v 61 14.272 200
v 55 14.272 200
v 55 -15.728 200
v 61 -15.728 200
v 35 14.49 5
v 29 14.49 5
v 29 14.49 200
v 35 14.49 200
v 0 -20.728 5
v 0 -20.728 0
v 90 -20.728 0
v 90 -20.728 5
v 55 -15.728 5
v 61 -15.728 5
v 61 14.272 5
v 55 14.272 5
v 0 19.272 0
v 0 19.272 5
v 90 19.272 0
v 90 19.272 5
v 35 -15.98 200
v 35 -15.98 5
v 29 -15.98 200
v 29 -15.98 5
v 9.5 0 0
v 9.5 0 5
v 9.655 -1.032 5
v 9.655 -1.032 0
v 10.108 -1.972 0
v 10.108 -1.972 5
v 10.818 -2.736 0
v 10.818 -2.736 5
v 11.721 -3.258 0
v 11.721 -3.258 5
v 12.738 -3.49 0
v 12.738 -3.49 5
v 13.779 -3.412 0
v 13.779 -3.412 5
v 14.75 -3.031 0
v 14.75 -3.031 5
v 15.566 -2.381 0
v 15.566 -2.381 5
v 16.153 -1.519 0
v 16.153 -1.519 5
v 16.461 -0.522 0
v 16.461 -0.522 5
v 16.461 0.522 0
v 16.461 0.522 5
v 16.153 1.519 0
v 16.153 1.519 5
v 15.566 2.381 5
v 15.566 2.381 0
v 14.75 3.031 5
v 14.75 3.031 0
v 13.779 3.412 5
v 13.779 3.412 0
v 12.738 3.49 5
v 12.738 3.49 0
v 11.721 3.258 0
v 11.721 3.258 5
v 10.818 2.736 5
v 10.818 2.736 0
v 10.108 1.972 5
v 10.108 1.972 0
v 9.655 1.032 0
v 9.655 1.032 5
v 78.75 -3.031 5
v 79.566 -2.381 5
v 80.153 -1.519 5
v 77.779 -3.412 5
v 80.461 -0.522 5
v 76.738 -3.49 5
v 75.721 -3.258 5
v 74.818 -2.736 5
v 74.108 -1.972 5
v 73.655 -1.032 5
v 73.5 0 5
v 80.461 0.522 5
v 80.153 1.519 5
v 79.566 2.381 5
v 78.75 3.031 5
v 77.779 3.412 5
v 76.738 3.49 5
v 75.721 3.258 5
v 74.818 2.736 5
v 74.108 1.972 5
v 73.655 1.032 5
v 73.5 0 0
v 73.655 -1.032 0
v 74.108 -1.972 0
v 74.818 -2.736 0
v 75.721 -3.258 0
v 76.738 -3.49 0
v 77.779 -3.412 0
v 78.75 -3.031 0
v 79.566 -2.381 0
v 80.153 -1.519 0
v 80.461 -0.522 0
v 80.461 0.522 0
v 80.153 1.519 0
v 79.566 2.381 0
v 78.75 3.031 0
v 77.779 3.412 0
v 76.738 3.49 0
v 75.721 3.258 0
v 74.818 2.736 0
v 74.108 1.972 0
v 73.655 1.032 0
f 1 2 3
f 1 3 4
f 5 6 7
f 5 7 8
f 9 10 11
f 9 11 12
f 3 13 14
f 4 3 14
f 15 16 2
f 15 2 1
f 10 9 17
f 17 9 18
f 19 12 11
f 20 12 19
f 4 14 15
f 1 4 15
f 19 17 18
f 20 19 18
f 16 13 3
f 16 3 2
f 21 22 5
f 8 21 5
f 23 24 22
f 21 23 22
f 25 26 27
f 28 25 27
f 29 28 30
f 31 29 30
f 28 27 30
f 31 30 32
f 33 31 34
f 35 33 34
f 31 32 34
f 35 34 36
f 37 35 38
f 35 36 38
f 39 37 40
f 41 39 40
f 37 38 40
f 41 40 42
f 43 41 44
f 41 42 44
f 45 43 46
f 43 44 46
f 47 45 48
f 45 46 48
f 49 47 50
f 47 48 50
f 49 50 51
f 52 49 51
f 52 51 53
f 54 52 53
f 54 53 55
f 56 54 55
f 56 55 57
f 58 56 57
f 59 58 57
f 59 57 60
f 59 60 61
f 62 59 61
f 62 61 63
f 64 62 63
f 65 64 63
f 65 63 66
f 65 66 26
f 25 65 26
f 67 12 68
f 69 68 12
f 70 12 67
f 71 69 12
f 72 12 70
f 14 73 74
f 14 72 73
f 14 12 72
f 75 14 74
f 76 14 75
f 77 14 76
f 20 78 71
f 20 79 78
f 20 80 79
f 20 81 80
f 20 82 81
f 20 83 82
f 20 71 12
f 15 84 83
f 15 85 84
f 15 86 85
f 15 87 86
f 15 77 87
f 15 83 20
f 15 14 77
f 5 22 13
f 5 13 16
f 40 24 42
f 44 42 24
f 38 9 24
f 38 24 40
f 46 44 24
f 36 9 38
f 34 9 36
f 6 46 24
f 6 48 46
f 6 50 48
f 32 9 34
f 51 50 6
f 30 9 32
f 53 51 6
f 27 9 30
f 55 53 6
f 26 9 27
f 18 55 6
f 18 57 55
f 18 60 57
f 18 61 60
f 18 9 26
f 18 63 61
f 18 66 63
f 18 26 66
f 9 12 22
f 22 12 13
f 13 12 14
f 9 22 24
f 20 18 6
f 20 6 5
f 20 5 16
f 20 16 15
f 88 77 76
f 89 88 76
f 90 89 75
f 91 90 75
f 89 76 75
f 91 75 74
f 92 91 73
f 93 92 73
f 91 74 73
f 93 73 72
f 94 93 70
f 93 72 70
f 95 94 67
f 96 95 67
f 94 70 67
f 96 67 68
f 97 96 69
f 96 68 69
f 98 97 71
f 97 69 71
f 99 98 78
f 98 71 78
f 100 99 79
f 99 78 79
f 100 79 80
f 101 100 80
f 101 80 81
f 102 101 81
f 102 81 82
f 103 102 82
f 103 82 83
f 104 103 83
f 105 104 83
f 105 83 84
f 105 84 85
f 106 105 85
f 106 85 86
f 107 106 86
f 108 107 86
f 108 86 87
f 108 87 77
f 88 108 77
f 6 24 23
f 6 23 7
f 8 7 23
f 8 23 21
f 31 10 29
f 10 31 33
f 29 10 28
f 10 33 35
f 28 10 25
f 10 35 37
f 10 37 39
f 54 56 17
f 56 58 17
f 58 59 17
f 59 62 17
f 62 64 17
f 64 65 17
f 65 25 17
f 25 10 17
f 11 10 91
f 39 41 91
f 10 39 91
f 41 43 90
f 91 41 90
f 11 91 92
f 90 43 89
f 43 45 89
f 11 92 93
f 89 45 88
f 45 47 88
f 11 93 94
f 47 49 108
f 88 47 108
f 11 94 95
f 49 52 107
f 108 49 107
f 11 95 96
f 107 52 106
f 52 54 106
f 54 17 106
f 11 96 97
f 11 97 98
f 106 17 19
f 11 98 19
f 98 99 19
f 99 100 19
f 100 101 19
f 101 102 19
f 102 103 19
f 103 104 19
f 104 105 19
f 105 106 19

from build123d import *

# Parameters (mm, degrees)
F0_W     = 40
F0_H     = 5
F1_DEPTH = 90
F2_W     = 6
F2_H     = 30.4702166427
F2_H_2   = 30
F3_DEPTH = 200
F5_D     = 7


# Not quite as in the source:
# - a feature names something its author has since deleted; it is built from what else it names


with BuildPart() as f1:
    # F0 (on Right) → F1 (new body)
    with BuildSketch(Plane.YZ):
        with Locations((-0.72813743, 2.5)):
            Rectangle(F0_W, F0_H)
    extrude(amount=F1_DEPTH)

    # F2 (on Top) → F3 (join)
    with BuildSketch(Plane.XY):
        with Locations((32, -0.7447636027)):
            Rectangle(F2_W, F2_H)
        with Locations((58, -0.72813743)):
            Rectangle(F2_W, F2_H_2)
    extrude(amount=F3_DEPTH)

    # F5 (through all)
    with Locations(Plane(origin=(0, 0, 0), x_dir=(1, 0, 0), z_dir=(0, 0, -1))):
        with Locations((13, 0), (77, 0)):
            Hole(F5_D / 2)


solid = f1.part
